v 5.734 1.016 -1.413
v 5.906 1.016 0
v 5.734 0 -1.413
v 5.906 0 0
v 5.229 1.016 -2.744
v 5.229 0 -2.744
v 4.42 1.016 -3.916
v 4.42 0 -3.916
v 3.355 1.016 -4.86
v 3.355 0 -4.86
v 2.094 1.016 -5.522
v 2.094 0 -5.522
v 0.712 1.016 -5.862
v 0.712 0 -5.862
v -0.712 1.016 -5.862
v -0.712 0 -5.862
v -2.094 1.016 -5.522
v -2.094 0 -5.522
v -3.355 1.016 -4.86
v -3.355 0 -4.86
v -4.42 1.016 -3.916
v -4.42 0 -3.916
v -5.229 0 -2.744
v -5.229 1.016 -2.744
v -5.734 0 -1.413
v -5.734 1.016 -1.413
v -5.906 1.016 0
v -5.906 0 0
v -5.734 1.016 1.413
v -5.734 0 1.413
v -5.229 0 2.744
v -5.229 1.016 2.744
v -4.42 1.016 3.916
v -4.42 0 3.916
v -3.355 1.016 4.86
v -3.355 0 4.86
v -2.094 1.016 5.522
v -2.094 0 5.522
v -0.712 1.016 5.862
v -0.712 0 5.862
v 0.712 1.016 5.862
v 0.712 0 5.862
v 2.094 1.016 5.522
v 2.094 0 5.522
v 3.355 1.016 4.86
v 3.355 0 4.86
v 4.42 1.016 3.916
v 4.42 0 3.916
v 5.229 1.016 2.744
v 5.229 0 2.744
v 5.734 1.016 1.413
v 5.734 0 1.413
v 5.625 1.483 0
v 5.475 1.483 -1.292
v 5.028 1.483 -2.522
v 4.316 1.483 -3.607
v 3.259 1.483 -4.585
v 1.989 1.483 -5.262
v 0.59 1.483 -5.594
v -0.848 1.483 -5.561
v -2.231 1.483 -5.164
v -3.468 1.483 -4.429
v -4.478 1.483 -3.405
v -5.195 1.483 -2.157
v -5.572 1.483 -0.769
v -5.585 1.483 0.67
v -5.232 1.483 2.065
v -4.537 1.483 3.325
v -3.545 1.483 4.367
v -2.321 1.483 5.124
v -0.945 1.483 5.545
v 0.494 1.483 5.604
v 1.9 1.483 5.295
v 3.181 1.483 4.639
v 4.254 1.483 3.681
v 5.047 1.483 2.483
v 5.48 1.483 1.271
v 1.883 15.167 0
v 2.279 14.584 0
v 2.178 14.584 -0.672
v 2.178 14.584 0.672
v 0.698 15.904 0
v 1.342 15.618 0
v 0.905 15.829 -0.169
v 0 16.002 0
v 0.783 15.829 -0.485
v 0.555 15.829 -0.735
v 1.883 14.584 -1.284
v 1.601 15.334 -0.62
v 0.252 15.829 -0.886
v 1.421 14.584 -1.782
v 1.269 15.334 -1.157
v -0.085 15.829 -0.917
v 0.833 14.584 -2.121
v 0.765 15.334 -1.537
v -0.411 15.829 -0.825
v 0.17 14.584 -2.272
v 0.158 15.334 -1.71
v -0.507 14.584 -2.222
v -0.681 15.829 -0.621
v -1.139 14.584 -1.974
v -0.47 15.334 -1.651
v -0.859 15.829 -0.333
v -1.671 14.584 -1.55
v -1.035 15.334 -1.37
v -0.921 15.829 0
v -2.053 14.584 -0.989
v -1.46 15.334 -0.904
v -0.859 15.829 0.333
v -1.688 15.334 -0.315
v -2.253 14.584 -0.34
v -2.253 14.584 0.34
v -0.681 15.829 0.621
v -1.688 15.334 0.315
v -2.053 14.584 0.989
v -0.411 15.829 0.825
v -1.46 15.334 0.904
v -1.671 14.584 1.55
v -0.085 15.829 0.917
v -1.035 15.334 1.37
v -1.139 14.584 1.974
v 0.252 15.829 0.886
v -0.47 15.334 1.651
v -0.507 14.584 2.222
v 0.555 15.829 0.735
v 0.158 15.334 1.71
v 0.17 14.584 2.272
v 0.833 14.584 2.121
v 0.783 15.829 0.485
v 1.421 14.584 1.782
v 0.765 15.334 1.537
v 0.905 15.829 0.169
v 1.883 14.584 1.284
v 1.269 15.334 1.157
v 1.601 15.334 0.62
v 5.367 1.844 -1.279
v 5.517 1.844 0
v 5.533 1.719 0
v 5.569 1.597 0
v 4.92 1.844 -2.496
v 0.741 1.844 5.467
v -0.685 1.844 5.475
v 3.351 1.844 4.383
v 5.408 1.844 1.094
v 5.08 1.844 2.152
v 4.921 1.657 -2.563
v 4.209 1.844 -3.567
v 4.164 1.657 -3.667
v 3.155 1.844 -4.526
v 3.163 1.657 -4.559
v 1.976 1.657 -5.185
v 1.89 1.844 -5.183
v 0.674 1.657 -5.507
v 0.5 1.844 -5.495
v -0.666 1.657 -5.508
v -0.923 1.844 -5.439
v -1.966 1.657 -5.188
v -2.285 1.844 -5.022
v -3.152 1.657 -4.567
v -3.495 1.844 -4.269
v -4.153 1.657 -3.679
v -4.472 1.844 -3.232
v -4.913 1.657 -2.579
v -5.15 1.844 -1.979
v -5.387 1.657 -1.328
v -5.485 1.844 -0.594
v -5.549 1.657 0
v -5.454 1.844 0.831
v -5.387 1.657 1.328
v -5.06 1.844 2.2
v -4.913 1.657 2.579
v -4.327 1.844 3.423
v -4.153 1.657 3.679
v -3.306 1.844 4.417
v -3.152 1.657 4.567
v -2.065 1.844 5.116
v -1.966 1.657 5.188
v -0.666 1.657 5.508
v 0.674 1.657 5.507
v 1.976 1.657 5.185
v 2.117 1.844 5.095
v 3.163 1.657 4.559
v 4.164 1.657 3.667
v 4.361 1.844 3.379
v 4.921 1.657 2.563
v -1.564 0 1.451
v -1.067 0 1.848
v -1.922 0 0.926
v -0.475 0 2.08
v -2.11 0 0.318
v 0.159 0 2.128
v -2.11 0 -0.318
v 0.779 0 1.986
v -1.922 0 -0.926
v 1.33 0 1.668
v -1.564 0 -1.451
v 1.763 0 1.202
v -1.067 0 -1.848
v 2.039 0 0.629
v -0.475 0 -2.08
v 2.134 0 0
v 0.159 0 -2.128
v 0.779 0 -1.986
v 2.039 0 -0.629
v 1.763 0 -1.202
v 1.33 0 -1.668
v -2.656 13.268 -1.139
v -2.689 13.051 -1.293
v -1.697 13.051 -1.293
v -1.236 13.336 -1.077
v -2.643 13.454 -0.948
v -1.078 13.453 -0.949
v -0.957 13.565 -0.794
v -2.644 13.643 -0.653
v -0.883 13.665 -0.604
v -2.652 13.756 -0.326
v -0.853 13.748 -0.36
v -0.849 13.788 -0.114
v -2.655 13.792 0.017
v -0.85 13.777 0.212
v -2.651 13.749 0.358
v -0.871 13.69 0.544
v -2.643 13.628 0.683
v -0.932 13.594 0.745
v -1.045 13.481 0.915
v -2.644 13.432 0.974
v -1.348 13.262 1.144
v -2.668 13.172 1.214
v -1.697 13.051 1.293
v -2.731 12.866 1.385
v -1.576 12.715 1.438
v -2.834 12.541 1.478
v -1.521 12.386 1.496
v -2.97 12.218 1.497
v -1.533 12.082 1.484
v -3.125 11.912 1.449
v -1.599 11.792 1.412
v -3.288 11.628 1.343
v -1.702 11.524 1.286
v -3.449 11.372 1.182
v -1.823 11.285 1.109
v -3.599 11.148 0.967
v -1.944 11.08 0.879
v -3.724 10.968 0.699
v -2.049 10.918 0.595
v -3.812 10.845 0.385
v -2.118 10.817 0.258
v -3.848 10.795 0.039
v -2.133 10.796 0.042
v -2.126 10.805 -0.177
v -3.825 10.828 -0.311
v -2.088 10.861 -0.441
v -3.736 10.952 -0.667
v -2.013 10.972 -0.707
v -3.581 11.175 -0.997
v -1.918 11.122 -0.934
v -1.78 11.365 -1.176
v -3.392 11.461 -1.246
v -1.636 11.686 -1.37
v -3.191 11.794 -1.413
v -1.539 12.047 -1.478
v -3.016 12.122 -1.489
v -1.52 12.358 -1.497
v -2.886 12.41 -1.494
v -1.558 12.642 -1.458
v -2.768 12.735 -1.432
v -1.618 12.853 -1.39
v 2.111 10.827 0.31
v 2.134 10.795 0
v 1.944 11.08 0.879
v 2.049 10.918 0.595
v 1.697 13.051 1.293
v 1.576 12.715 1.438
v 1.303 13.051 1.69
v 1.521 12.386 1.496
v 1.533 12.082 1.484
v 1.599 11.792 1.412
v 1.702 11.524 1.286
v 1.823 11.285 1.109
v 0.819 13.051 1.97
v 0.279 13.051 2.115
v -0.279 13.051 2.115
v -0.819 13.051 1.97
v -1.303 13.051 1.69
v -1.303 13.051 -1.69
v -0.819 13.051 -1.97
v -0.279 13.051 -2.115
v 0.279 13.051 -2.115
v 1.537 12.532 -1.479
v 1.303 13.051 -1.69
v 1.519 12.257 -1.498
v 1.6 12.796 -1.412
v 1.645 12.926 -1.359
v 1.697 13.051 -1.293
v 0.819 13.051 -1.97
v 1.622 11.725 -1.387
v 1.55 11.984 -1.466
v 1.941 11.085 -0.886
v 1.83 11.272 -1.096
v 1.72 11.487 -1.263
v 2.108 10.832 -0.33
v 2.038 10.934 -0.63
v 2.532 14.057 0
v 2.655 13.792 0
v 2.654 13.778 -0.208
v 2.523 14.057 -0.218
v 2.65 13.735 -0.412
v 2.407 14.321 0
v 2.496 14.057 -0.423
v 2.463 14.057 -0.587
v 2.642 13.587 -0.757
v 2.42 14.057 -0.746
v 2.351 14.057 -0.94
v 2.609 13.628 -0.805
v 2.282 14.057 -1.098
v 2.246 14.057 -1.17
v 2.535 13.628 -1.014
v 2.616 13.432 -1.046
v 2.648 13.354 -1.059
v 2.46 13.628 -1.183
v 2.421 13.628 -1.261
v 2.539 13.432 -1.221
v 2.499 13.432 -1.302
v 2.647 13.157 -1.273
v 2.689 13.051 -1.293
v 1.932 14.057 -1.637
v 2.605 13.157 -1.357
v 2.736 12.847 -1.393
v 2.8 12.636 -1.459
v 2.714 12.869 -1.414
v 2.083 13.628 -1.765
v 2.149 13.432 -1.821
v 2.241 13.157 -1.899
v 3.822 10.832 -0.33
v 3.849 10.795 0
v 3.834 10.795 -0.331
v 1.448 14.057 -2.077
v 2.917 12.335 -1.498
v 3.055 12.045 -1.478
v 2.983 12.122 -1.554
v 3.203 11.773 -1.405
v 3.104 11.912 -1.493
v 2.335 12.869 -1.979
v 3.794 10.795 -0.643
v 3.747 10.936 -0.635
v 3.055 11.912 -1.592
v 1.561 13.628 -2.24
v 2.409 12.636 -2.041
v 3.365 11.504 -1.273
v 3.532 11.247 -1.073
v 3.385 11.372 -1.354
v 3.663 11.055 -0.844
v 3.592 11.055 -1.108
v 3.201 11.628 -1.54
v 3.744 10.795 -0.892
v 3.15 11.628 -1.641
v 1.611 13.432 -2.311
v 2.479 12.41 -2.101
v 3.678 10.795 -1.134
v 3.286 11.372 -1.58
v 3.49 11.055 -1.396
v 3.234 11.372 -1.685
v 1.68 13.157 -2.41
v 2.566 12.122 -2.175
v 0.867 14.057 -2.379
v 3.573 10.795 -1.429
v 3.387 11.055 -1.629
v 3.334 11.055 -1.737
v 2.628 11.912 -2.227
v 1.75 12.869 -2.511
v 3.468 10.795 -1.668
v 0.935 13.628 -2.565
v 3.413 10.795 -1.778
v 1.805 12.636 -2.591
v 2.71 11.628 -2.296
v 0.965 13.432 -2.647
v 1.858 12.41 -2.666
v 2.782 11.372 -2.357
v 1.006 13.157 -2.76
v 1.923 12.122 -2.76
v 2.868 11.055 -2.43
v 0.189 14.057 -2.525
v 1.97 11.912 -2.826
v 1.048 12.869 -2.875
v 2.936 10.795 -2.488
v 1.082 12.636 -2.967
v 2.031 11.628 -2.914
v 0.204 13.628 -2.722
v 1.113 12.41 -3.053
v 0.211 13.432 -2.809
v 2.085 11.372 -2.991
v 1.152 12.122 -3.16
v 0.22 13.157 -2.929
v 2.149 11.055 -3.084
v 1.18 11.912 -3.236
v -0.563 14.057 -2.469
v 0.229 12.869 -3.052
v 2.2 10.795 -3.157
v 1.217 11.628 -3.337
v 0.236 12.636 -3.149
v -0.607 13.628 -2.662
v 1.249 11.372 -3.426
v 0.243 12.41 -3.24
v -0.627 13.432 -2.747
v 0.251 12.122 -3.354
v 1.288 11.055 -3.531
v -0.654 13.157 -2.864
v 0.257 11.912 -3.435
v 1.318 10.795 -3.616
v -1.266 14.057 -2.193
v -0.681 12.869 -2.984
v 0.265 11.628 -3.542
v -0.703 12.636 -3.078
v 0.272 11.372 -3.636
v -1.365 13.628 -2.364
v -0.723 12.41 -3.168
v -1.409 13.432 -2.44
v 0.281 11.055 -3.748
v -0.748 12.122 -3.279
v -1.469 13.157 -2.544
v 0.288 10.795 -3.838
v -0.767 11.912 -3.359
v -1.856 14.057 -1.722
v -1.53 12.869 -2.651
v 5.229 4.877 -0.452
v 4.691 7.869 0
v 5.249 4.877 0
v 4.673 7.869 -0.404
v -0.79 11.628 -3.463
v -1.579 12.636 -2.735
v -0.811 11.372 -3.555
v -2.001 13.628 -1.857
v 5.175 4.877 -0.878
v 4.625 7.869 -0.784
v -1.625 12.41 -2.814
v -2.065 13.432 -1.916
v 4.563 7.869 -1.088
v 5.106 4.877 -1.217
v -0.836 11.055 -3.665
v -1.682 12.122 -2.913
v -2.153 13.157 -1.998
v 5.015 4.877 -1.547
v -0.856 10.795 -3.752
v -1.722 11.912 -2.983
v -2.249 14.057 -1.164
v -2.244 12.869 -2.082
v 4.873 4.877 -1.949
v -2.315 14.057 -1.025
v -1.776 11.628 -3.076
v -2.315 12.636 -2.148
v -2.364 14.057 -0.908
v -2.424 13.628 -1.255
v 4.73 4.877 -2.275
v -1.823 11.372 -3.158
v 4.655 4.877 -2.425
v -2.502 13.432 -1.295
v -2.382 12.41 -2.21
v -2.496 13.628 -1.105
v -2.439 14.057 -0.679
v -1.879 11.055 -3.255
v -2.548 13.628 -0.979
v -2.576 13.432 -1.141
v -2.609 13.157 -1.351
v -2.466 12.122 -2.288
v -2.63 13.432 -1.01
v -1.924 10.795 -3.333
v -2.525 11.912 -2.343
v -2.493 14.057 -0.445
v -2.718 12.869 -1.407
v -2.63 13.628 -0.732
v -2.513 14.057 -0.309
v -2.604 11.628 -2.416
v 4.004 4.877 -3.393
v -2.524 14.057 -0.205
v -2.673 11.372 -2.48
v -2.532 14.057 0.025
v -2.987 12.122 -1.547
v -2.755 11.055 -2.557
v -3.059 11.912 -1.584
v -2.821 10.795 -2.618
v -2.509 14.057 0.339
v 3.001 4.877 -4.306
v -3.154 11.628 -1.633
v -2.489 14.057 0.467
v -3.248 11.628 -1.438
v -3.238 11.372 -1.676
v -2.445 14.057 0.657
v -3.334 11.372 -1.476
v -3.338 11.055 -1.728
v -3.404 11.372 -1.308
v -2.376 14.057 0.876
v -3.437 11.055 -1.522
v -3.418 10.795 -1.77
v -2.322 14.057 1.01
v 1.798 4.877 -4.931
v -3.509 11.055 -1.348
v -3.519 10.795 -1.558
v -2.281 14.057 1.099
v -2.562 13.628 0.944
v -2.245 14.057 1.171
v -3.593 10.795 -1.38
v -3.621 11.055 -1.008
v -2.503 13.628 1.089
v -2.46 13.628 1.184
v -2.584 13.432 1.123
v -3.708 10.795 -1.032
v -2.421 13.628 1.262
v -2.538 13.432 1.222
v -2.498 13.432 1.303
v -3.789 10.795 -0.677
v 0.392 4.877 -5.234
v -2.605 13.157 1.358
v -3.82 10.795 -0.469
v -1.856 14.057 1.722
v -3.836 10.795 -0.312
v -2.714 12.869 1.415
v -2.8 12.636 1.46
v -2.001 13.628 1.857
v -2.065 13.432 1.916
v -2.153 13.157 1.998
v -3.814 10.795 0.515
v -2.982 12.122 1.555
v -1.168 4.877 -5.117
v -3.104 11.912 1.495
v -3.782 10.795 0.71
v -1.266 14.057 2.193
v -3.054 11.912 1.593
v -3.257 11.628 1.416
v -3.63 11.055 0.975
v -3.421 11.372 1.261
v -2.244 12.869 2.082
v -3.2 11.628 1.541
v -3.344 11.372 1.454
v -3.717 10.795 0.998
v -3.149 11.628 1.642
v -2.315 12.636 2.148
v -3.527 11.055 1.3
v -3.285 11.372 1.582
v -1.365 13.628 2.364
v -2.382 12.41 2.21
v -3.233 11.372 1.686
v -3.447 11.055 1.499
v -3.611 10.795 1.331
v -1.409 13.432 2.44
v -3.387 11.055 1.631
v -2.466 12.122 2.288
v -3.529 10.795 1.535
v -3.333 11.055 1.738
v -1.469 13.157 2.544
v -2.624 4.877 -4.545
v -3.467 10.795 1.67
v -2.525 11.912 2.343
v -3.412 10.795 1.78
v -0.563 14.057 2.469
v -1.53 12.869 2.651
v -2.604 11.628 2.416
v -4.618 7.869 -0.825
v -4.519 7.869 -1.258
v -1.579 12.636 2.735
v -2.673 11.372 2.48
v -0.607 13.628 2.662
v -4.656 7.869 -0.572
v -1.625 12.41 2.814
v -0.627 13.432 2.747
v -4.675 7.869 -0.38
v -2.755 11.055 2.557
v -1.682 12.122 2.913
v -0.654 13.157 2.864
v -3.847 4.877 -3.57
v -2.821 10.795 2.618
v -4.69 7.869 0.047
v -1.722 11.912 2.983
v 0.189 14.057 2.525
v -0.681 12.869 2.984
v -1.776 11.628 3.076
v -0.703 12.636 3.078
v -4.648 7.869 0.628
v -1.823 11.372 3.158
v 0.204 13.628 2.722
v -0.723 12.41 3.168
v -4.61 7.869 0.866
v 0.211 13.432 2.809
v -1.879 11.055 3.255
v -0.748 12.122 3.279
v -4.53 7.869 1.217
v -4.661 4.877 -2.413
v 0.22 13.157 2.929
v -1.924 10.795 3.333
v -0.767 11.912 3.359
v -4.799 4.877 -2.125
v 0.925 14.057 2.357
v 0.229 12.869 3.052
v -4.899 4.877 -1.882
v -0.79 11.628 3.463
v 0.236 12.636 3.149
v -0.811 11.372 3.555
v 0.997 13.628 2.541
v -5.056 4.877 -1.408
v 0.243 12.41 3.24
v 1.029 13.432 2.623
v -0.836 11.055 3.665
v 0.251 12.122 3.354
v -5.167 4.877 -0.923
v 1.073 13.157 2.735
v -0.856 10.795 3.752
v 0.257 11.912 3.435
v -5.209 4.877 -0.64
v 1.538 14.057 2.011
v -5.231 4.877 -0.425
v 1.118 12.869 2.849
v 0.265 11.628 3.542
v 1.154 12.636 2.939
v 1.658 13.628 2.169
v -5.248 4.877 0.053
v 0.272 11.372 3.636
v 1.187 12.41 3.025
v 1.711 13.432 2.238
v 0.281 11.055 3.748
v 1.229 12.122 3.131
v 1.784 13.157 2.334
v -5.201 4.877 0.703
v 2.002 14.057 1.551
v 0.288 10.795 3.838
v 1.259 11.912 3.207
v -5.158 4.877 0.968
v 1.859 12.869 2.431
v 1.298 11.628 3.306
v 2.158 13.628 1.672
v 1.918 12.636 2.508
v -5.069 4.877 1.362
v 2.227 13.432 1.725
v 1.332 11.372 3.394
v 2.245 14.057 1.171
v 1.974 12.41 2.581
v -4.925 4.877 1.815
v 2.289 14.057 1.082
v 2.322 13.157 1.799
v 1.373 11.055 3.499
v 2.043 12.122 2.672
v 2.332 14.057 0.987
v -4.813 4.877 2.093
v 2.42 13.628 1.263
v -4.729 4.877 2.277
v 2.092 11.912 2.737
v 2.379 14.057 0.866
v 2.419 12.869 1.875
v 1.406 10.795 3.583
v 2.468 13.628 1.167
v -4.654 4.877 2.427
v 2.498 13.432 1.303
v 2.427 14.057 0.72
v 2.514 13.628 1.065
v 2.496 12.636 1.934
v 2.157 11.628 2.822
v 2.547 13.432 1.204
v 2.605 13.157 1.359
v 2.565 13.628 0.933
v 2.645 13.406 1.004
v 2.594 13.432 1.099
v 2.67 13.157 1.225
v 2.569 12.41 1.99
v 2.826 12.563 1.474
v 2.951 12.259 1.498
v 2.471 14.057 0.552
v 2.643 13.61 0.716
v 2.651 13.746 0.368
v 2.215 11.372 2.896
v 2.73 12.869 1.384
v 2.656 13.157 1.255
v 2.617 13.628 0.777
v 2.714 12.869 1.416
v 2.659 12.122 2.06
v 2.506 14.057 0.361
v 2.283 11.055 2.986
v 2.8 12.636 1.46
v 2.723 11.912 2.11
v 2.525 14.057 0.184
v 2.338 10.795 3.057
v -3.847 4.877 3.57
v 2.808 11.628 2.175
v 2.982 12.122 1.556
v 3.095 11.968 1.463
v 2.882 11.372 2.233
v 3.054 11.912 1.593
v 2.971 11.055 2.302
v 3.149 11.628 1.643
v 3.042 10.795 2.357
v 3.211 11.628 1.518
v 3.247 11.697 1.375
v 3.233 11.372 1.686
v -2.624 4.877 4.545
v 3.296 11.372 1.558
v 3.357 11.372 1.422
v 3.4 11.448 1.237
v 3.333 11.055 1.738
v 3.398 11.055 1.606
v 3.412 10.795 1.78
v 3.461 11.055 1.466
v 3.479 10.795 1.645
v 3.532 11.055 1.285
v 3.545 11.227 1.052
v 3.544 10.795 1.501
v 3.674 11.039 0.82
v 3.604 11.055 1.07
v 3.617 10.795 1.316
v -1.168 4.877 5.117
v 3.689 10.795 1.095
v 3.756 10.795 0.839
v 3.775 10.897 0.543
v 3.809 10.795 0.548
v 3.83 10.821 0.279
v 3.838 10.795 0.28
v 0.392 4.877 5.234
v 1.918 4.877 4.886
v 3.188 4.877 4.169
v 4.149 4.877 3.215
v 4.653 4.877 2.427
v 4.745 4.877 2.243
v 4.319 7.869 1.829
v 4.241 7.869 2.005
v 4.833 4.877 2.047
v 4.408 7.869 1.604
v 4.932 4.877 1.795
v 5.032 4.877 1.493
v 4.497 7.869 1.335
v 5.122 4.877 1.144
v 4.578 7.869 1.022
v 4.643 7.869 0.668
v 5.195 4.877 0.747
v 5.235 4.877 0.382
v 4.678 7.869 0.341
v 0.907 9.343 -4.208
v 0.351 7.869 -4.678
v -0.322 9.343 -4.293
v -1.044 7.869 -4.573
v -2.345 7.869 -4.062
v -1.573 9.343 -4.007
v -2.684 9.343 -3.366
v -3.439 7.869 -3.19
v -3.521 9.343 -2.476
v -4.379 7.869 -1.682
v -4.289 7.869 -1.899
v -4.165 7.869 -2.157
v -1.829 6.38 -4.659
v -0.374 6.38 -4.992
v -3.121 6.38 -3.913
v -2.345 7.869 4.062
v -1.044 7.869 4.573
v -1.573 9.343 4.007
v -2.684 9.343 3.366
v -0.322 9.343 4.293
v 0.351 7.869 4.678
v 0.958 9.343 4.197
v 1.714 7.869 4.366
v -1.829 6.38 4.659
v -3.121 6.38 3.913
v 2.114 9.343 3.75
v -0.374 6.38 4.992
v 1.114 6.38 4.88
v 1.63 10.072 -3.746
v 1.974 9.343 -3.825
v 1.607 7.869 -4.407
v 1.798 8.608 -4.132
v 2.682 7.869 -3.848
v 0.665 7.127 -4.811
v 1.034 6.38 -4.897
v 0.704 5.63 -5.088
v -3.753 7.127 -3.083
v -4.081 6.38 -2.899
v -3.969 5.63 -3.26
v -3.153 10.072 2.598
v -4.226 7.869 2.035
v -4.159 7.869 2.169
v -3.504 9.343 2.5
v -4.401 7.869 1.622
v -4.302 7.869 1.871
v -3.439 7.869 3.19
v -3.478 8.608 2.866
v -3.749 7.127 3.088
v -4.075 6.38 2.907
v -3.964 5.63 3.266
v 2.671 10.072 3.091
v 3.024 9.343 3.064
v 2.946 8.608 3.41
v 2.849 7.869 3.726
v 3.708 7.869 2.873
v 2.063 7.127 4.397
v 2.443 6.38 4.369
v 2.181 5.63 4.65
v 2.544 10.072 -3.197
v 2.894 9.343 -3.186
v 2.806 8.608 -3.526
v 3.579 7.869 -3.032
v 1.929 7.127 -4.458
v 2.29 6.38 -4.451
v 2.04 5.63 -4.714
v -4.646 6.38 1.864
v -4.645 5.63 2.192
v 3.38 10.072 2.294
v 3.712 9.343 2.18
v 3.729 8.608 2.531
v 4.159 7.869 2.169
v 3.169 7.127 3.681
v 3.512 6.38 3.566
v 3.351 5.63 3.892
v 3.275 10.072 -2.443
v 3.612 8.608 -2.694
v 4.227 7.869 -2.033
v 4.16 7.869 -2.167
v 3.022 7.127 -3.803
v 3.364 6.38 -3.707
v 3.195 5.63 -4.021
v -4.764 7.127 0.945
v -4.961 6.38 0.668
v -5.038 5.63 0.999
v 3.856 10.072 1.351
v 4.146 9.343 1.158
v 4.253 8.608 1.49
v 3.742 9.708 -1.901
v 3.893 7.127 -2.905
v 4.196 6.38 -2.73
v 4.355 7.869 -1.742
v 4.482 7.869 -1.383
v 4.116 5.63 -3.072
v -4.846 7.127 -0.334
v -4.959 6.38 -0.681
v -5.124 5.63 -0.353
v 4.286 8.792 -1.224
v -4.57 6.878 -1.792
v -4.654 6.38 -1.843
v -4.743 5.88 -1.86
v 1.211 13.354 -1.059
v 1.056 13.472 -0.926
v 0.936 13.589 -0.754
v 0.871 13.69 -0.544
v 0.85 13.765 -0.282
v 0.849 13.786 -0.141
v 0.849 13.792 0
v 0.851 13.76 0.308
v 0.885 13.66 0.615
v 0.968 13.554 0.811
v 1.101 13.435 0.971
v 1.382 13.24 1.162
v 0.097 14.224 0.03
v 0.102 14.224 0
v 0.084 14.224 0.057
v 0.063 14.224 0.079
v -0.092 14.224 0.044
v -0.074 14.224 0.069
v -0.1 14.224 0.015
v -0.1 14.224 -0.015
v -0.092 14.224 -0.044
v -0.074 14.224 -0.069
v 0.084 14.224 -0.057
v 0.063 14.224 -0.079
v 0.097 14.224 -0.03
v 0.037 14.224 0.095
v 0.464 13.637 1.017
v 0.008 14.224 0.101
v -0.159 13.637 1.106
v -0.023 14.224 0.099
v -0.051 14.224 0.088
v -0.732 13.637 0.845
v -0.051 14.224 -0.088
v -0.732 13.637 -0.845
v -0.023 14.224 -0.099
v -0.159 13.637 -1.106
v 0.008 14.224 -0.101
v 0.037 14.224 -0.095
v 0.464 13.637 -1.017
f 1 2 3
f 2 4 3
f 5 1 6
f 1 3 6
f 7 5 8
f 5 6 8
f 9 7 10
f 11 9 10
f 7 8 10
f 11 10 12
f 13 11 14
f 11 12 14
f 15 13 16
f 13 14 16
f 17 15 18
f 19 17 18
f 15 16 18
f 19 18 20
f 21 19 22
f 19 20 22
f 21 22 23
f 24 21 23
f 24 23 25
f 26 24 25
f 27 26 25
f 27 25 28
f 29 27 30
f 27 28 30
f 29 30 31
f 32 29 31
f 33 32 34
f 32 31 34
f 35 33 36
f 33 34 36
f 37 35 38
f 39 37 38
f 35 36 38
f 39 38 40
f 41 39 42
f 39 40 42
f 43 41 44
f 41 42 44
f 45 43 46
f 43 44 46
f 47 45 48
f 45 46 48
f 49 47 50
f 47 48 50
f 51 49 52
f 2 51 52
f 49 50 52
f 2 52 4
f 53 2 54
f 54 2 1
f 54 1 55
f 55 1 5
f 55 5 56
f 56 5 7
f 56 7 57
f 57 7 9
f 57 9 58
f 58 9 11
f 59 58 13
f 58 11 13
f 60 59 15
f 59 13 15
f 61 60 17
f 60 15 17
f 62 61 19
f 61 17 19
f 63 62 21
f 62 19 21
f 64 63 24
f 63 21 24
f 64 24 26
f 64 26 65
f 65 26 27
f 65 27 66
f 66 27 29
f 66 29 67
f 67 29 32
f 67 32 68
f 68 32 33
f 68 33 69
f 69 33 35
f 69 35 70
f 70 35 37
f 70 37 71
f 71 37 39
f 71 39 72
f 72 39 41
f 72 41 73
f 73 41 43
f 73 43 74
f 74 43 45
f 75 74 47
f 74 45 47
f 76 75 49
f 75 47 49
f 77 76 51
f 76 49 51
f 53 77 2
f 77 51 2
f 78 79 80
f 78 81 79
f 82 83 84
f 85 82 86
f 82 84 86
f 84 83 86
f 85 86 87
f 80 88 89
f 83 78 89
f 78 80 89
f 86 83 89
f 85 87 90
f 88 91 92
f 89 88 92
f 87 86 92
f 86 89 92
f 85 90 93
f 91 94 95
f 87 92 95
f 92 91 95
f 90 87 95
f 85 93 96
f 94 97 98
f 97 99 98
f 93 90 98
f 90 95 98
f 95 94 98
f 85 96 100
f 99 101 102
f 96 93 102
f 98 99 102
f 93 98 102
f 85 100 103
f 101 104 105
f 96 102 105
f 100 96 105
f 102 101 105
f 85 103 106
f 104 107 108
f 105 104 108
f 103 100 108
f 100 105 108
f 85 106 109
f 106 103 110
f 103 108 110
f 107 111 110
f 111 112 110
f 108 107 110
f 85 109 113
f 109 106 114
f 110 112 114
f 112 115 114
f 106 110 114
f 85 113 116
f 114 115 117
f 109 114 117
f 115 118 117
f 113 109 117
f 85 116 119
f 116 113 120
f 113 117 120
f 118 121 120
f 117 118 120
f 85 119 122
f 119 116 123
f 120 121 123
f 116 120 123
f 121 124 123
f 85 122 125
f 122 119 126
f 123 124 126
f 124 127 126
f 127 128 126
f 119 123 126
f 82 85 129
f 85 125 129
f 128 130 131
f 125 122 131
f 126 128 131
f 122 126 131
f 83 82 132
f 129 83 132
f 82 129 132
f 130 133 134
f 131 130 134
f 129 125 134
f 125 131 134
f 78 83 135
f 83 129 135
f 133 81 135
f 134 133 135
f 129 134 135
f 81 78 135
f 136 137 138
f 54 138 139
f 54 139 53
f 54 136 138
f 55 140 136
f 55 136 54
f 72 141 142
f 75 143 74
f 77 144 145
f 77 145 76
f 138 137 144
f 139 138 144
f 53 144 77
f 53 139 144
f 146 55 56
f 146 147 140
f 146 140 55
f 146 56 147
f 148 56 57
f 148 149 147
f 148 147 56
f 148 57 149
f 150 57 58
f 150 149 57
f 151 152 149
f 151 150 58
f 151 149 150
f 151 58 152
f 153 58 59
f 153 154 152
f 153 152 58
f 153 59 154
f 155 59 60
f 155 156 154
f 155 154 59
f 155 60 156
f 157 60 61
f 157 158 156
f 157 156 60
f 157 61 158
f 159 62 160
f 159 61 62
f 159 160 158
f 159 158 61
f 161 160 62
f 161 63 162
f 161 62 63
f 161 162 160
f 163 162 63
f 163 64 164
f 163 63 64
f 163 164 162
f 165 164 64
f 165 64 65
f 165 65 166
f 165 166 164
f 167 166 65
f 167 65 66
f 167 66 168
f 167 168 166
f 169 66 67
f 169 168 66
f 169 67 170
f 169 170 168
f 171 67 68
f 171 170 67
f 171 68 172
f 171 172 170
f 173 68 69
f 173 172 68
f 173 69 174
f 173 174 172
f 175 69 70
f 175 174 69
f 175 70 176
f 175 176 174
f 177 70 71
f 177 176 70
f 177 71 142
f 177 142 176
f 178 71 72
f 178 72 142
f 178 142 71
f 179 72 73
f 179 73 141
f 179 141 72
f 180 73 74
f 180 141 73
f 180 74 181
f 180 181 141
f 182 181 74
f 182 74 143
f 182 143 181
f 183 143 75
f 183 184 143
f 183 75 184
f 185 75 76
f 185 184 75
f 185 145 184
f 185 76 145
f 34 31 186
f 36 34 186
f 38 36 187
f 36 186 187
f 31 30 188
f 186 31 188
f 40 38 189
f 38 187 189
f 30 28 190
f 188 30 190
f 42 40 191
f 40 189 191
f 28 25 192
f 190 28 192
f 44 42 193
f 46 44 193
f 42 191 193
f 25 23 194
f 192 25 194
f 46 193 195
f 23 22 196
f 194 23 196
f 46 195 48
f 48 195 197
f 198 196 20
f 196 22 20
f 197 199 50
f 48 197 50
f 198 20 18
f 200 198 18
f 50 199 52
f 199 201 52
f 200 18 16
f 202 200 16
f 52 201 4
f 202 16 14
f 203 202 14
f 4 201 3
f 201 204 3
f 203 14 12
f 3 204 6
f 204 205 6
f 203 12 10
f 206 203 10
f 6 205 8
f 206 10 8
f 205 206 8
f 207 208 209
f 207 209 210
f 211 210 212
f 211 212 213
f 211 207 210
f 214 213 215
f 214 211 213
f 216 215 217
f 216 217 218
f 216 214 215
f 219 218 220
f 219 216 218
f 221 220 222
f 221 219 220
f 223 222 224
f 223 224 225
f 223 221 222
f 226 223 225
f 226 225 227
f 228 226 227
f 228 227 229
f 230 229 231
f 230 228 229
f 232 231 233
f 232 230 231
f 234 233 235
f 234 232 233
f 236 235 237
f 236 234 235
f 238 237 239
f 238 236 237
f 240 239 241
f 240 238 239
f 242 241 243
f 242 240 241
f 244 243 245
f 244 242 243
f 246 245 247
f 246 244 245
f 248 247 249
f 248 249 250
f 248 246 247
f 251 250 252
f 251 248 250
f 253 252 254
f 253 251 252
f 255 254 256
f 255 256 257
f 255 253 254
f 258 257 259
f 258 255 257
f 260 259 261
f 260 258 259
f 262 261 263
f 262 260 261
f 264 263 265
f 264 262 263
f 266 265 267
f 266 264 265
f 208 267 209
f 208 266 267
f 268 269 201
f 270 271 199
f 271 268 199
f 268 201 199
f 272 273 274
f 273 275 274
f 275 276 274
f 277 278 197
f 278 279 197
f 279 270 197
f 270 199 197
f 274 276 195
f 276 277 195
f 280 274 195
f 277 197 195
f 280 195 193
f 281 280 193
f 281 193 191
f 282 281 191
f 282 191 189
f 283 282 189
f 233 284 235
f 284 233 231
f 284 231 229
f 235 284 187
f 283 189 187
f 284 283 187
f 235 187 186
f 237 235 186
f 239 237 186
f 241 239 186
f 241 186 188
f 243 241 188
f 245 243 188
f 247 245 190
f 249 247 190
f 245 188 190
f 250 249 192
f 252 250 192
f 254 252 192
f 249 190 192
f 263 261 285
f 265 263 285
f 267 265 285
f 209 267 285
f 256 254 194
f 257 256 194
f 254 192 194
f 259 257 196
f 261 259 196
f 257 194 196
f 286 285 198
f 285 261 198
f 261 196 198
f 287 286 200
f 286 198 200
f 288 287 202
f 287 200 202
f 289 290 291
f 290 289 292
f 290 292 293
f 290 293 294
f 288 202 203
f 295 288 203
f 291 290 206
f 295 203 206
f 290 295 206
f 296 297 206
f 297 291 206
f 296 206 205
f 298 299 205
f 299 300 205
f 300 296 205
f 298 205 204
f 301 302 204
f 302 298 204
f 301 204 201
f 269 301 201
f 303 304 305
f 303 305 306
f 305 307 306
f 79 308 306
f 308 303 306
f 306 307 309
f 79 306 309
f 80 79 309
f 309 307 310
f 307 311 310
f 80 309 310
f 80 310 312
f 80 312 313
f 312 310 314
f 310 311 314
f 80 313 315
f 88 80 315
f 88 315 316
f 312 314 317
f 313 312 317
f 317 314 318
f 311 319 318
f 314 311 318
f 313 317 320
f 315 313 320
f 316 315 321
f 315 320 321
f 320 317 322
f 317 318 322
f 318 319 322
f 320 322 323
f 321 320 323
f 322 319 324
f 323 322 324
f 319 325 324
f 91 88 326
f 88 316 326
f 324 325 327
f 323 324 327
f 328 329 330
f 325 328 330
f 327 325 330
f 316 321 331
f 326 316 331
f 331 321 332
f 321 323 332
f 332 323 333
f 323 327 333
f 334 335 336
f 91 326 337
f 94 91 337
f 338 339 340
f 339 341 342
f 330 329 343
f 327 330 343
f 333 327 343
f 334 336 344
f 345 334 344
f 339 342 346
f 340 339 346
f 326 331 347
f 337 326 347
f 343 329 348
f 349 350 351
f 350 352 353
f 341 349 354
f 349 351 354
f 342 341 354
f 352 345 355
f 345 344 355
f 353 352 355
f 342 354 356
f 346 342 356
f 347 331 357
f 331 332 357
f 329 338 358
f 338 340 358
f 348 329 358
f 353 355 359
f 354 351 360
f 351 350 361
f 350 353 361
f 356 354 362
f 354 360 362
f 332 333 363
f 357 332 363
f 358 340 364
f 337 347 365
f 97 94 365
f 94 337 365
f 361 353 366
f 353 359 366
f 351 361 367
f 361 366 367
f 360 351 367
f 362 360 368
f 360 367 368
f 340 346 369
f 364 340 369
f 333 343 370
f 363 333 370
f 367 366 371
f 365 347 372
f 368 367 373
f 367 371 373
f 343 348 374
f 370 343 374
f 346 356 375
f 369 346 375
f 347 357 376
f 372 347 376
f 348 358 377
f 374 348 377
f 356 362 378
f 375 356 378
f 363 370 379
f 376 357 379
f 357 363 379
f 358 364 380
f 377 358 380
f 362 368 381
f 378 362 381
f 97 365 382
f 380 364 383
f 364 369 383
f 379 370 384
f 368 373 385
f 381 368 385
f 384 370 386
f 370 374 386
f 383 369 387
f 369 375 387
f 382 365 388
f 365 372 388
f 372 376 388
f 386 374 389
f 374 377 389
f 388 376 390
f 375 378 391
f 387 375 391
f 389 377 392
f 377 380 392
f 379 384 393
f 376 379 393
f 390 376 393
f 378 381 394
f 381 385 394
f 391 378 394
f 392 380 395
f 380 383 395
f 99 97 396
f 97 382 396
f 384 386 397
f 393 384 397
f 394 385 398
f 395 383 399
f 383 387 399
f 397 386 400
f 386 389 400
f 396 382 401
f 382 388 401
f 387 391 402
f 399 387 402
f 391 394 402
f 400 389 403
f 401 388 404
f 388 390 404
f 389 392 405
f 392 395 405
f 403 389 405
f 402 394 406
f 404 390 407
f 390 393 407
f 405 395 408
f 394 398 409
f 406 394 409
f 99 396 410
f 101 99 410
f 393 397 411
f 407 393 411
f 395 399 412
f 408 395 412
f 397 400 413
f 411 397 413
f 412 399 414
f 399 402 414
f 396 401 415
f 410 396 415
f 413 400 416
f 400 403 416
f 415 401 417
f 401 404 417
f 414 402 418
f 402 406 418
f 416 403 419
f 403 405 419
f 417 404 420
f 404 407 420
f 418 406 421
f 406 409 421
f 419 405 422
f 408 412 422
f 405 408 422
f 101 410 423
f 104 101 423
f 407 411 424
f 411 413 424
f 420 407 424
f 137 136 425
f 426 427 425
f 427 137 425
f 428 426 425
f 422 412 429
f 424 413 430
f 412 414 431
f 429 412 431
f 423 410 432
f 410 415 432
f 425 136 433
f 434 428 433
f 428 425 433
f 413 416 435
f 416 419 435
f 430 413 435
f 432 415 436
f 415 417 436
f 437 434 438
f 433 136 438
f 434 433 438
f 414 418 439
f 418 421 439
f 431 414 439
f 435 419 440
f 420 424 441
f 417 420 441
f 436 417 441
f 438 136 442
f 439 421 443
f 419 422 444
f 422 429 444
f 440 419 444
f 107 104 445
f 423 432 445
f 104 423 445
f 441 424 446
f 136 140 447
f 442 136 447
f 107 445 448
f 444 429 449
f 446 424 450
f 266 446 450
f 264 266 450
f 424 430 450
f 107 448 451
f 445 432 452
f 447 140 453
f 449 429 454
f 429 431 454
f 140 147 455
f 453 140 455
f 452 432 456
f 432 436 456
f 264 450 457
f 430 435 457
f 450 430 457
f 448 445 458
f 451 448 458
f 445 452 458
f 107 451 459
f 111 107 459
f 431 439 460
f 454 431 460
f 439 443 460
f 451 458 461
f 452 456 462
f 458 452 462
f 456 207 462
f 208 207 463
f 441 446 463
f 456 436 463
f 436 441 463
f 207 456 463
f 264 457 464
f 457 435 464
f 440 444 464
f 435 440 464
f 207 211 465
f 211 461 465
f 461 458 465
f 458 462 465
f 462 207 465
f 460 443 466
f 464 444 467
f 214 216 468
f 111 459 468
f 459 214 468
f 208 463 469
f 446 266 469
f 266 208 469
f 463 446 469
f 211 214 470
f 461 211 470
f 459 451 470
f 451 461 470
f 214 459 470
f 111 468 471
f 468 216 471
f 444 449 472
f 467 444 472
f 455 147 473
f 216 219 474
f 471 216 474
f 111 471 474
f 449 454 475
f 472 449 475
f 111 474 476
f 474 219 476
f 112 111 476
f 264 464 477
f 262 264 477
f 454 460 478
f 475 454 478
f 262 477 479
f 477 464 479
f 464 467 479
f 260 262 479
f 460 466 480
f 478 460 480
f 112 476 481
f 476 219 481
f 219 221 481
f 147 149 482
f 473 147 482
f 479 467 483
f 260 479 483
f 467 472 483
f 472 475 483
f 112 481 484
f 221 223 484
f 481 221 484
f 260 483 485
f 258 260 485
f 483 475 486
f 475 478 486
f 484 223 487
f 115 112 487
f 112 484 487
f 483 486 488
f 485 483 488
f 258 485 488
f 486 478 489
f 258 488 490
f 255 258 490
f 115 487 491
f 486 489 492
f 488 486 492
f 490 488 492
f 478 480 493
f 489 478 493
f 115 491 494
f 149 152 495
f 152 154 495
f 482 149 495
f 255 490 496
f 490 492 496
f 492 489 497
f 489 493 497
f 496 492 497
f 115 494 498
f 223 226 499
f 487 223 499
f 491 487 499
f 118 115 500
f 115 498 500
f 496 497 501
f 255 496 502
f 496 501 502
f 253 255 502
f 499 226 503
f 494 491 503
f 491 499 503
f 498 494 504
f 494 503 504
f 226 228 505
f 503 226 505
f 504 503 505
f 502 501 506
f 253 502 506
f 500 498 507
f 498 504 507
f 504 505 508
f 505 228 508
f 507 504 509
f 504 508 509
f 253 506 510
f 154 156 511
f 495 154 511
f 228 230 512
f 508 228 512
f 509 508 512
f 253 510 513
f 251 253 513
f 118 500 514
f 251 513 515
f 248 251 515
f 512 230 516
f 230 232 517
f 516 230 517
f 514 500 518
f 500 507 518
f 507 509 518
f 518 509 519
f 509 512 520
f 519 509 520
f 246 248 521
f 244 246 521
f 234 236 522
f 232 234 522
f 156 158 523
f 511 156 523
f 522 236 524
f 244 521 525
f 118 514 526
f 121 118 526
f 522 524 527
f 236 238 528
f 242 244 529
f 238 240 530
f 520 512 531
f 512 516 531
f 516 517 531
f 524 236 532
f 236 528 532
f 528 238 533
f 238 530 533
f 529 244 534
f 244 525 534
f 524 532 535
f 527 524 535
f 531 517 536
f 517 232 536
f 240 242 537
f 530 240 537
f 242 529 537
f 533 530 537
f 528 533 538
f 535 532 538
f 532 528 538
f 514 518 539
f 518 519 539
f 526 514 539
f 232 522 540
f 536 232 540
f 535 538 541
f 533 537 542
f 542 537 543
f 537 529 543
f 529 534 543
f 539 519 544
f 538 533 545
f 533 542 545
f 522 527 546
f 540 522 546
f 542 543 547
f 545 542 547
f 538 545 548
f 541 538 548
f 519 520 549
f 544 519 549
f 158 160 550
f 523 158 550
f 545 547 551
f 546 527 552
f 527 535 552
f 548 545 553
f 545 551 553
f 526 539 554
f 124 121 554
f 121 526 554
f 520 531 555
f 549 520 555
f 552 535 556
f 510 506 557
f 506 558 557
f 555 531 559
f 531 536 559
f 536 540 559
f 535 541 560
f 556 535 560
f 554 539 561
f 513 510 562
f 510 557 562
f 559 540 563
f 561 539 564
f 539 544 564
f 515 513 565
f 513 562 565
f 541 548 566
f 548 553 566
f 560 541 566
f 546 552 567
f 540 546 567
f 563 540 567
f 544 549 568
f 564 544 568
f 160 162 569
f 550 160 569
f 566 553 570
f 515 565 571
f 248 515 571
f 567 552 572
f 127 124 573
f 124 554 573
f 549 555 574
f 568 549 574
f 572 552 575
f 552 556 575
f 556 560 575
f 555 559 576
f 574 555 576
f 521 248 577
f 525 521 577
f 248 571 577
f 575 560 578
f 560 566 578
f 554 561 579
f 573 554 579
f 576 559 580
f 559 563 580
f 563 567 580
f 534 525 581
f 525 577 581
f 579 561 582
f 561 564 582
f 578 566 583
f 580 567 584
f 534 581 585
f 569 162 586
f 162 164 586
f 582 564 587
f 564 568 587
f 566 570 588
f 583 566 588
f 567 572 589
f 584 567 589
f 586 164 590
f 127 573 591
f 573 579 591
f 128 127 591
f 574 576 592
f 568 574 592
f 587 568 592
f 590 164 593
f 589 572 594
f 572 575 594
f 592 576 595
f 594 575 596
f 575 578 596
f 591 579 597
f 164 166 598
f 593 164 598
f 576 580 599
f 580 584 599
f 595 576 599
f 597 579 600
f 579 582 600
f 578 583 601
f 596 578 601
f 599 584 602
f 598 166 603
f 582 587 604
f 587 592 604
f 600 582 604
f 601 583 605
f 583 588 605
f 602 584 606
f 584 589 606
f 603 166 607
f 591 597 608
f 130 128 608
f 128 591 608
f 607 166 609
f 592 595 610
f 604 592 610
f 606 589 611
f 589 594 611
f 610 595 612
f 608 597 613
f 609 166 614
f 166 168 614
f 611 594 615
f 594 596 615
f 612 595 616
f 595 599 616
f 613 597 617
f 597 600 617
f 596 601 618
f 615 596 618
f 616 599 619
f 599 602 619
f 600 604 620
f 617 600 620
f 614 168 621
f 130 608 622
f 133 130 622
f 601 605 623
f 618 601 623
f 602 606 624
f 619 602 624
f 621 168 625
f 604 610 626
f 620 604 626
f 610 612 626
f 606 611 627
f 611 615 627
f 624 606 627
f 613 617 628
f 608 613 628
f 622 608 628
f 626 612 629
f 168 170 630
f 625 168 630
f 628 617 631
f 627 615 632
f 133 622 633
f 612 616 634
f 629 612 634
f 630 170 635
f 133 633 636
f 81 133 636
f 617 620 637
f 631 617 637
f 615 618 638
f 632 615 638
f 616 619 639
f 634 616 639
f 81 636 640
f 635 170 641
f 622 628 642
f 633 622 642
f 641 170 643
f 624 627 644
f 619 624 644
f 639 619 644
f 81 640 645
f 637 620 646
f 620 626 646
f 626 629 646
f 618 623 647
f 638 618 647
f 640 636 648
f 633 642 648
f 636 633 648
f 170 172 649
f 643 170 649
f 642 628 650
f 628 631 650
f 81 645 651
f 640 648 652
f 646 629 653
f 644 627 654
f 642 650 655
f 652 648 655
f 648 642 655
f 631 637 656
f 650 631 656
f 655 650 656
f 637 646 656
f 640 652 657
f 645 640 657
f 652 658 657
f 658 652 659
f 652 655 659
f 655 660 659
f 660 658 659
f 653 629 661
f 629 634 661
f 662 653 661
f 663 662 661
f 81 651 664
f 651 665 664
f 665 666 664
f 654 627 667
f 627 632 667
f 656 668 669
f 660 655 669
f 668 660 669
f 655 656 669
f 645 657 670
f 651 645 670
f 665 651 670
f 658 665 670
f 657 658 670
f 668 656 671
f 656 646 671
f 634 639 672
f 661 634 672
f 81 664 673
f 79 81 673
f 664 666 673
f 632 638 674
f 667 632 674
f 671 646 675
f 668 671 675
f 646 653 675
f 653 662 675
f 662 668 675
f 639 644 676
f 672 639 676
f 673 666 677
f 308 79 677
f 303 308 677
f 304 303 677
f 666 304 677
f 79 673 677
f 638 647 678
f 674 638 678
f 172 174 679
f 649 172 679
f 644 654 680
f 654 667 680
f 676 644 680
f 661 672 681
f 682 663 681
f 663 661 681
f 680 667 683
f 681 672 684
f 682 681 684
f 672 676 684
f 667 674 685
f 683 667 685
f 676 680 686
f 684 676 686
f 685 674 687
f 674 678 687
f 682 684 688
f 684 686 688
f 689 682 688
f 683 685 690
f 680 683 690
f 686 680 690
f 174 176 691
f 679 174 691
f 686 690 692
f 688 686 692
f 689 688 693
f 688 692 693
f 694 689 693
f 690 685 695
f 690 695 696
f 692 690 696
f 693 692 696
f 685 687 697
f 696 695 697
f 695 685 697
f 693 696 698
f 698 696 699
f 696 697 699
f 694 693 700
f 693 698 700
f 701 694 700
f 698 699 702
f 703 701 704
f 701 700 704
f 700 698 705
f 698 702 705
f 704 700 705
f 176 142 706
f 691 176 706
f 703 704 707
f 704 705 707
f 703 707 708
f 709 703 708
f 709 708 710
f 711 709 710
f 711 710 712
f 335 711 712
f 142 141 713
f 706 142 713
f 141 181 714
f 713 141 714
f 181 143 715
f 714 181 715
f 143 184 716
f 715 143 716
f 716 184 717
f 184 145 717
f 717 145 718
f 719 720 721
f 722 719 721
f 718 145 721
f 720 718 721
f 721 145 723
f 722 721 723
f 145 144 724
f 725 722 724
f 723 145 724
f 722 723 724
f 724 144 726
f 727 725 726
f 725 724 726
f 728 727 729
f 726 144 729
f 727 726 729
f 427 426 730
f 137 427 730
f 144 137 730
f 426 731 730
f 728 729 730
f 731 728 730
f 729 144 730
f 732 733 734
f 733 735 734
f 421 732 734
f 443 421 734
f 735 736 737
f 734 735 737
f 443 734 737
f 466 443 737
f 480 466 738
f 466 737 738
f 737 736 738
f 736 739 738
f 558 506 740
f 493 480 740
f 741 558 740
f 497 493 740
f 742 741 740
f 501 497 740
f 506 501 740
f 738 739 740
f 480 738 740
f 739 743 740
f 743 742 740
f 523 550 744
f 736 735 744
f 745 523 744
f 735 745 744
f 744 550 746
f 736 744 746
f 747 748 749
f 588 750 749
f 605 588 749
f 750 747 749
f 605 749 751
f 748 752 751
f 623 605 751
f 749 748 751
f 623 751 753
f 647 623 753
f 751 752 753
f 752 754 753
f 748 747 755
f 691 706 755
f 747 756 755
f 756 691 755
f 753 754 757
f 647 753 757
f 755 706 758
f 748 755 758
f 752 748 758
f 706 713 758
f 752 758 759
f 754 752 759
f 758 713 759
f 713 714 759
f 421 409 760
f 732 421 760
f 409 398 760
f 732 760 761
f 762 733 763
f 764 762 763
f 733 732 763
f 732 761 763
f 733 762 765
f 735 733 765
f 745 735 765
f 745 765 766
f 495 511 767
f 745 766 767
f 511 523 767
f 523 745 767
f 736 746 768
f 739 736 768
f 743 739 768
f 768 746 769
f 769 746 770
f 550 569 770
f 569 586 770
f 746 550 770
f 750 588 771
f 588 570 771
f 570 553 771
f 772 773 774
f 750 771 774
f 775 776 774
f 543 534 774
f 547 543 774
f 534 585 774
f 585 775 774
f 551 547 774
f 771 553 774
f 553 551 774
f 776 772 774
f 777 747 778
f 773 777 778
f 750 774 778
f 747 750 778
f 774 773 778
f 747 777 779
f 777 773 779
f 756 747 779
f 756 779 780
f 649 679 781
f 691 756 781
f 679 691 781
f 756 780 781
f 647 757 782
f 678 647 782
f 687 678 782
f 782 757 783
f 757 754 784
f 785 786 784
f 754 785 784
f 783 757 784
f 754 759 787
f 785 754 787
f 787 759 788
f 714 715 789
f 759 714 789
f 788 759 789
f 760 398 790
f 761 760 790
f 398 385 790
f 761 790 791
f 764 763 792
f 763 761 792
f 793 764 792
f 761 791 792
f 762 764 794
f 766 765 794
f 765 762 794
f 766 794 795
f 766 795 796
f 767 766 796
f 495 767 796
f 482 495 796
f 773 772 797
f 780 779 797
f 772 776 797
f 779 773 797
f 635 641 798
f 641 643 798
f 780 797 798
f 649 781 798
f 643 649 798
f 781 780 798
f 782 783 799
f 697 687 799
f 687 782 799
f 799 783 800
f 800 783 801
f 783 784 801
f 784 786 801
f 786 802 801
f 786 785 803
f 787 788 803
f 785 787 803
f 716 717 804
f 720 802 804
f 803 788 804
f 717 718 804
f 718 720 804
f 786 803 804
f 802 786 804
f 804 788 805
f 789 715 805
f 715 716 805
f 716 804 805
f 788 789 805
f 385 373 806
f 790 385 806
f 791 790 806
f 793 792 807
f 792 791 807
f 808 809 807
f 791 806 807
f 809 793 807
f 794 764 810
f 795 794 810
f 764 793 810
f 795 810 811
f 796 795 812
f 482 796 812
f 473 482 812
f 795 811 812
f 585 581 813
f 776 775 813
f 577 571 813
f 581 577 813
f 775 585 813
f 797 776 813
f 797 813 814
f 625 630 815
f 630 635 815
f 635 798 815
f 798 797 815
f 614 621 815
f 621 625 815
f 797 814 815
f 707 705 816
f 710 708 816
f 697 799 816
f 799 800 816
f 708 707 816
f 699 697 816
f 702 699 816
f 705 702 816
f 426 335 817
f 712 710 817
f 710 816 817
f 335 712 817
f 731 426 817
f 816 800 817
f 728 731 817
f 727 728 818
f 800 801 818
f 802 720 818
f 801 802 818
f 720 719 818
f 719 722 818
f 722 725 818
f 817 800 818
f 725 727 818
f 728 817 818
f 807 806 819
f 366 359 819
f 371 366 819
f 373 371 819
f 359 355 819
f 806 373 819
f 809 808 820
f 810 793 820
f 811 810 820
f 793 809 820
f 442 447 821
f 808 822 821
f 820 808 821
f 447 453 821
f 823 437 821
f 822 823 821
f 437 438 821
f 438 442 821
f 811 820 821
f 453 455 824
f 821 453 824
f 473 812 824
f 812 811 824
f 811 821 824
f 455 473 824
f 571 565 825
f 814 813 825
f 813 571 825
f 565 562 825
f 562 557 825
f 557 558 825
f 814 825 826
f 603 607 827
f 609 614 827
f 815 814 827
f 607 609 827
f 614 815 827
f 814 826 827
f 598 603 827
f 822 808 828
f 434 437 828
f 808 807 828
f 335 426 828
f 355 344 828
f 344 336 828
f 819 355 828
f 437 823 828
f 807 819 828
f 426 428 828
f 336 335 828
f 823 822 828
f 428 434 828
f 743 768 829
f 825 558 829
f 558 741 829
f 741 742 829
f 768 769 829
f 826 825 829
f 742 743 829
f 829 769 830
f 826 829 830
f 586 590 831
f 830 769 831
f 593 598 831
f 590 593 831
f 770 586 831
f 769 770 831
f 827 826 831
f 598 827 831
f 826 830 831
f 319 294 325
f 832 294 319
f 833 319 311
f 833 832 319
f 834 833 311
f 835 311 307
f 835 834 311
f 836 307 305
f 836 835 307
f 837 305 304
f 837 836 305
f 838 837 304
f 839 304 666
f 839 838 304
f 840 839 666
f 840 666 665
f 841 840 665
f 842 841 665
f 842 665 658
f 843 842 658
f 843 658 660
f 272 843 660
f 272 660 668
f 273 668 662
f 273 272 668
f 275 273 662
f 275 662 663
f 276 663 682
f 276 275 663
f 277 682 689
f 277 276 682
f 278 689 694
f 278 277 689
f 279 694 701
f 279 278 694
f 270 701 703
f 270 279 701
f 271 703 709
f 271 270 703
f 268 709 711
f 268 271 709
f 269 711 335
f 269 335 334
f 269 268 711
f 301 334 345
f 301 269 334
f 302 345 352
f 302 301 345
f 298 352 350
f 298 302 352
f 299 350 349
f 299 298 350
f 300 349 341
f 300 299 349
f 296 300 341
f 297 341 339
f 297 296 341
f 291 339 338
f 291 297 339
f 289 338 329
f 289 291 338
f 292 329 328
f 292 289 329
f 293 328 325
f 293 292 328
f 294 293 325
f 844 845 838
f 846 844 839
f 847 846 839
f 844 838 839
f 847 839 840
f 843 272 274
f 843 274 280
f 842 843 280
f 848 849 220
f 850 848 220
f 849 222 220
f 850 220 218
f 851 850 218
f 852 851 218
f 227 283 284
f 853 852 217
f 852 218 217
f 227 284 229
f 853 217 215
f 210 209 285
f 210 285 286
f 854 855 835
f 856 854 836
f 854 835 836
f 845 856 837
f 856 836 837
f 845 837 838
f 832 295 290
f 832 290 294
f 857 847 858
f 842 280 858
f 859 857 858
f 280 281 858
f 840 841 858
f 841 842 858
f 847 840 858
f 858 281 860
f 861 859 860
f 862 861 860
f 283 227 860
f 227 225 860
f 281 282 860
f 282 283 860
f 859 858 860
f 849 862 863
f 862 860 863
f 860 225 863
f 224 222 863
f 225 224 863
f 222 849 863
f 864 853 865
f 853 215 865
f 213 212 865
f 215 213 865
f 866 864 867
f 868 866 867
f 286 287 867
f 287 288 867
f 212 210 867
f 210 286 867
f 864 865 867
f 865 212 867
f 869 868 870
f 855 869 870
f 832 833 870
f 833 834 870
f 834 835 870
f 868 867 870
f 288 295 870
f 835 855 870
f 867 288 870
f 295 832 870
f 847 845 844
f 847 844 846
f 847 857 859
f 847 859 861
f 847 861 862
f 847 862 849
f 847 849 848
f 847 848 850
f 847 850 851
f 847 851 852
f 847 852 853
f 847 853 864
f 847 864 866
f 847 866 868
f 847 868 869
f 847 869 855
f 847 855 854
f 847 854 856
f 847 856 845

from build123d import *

# Parameters (mm, degrees)
SKETCH2_R               = 2.1336
CUT_EXTRUDE1_DEPTH      = 14.224
CHAMFER1_SIZE           = 2.032
CHAMFER1_SIZE2          = 1.173175747
CUT_EXTRUDE2_DEPTH      = 19.050314803
CUT_EXTRUDE2_DEPTH_BACK = 19.050314803
SKETCH3_R               = 1.4986
FILLET1_R               = 0.762


with BuildPart() as part:
    # Sketch1 → Revolve1 (revolve)
    with BuildSketch(Plane.XY):
        with BuildLine():
            Line((0, 0), (0, 16.002))
            ThreePointArc((0, 16.002), (1.342055956, 15.618498507), (2.278851705, 14.583799851))
            ThreePointArc((2.278851705, 14.583799851), (4.588242678, 8.28970248), (5.5245, 1.651))
            Line((5.5245, 1.651), (5.9055, 1.016))
            Line((5.9055, 1.016), (5.9055, 0))
            Line((5.9055, 0), (0, 0))
        make_face()
    revolve(axis=Axis((0, 16.002, 0), (0, 1, 0)))

    # Sketch2 → Cut-Extrude1 (cut)
    with BuildSketch(Plane.XZ):
        Circle(SKETCH2_R)
    extrude(amount=-CUT_EXTRUDE1_DEPTH, mode=Mode.SUBTRACT)

    # Chamfer1
    chamfer1_edges = [part.edges().sort_by_distance(p)[0] for p in [
        (-2.1336, 14.224, 0),
    ]]
    chamfer1_side = [part.faces().sort_by_distance(p)[0] for p in [
        (0, 14.224, 0),
    ]]
    chamfer(chamfer1_edges, length=CHAMFER1_SIZE, length2=CHAMFER1_SIZE2, reference=chamfer1_side[0])

    # Sketch3 → Cut-Extrude2 (cut, two sides: drawn at the far end of the back side and taken through both)
    with BuildSketch(Plane(origin=(0, 0, 0), x_dir=(0, 0, -1), z_dir=(1, 0, 0)).offset(-CUT_EXTRUDE2_DEPTH_BACK)):
        with Locations(Location((0, 12.2936, 0), (0, 0, 30.350455713))):
            Circle(SKETCH3_R)
    extrude(amount=CUT_EXTRUDE2_DEPTH + CUT_EXTRUDE2_DEPTH_BACK, mode=Mode.SUBTRACT)

    # Fillet1
    fillet1_edges = [part.edges().sort_by_distance(p)[0] for p in [
        (-5.5245, 1.651, 0),
    ]]
    fillet(fillet1_edges, radius=FILLET1_R)


solid = part.part
